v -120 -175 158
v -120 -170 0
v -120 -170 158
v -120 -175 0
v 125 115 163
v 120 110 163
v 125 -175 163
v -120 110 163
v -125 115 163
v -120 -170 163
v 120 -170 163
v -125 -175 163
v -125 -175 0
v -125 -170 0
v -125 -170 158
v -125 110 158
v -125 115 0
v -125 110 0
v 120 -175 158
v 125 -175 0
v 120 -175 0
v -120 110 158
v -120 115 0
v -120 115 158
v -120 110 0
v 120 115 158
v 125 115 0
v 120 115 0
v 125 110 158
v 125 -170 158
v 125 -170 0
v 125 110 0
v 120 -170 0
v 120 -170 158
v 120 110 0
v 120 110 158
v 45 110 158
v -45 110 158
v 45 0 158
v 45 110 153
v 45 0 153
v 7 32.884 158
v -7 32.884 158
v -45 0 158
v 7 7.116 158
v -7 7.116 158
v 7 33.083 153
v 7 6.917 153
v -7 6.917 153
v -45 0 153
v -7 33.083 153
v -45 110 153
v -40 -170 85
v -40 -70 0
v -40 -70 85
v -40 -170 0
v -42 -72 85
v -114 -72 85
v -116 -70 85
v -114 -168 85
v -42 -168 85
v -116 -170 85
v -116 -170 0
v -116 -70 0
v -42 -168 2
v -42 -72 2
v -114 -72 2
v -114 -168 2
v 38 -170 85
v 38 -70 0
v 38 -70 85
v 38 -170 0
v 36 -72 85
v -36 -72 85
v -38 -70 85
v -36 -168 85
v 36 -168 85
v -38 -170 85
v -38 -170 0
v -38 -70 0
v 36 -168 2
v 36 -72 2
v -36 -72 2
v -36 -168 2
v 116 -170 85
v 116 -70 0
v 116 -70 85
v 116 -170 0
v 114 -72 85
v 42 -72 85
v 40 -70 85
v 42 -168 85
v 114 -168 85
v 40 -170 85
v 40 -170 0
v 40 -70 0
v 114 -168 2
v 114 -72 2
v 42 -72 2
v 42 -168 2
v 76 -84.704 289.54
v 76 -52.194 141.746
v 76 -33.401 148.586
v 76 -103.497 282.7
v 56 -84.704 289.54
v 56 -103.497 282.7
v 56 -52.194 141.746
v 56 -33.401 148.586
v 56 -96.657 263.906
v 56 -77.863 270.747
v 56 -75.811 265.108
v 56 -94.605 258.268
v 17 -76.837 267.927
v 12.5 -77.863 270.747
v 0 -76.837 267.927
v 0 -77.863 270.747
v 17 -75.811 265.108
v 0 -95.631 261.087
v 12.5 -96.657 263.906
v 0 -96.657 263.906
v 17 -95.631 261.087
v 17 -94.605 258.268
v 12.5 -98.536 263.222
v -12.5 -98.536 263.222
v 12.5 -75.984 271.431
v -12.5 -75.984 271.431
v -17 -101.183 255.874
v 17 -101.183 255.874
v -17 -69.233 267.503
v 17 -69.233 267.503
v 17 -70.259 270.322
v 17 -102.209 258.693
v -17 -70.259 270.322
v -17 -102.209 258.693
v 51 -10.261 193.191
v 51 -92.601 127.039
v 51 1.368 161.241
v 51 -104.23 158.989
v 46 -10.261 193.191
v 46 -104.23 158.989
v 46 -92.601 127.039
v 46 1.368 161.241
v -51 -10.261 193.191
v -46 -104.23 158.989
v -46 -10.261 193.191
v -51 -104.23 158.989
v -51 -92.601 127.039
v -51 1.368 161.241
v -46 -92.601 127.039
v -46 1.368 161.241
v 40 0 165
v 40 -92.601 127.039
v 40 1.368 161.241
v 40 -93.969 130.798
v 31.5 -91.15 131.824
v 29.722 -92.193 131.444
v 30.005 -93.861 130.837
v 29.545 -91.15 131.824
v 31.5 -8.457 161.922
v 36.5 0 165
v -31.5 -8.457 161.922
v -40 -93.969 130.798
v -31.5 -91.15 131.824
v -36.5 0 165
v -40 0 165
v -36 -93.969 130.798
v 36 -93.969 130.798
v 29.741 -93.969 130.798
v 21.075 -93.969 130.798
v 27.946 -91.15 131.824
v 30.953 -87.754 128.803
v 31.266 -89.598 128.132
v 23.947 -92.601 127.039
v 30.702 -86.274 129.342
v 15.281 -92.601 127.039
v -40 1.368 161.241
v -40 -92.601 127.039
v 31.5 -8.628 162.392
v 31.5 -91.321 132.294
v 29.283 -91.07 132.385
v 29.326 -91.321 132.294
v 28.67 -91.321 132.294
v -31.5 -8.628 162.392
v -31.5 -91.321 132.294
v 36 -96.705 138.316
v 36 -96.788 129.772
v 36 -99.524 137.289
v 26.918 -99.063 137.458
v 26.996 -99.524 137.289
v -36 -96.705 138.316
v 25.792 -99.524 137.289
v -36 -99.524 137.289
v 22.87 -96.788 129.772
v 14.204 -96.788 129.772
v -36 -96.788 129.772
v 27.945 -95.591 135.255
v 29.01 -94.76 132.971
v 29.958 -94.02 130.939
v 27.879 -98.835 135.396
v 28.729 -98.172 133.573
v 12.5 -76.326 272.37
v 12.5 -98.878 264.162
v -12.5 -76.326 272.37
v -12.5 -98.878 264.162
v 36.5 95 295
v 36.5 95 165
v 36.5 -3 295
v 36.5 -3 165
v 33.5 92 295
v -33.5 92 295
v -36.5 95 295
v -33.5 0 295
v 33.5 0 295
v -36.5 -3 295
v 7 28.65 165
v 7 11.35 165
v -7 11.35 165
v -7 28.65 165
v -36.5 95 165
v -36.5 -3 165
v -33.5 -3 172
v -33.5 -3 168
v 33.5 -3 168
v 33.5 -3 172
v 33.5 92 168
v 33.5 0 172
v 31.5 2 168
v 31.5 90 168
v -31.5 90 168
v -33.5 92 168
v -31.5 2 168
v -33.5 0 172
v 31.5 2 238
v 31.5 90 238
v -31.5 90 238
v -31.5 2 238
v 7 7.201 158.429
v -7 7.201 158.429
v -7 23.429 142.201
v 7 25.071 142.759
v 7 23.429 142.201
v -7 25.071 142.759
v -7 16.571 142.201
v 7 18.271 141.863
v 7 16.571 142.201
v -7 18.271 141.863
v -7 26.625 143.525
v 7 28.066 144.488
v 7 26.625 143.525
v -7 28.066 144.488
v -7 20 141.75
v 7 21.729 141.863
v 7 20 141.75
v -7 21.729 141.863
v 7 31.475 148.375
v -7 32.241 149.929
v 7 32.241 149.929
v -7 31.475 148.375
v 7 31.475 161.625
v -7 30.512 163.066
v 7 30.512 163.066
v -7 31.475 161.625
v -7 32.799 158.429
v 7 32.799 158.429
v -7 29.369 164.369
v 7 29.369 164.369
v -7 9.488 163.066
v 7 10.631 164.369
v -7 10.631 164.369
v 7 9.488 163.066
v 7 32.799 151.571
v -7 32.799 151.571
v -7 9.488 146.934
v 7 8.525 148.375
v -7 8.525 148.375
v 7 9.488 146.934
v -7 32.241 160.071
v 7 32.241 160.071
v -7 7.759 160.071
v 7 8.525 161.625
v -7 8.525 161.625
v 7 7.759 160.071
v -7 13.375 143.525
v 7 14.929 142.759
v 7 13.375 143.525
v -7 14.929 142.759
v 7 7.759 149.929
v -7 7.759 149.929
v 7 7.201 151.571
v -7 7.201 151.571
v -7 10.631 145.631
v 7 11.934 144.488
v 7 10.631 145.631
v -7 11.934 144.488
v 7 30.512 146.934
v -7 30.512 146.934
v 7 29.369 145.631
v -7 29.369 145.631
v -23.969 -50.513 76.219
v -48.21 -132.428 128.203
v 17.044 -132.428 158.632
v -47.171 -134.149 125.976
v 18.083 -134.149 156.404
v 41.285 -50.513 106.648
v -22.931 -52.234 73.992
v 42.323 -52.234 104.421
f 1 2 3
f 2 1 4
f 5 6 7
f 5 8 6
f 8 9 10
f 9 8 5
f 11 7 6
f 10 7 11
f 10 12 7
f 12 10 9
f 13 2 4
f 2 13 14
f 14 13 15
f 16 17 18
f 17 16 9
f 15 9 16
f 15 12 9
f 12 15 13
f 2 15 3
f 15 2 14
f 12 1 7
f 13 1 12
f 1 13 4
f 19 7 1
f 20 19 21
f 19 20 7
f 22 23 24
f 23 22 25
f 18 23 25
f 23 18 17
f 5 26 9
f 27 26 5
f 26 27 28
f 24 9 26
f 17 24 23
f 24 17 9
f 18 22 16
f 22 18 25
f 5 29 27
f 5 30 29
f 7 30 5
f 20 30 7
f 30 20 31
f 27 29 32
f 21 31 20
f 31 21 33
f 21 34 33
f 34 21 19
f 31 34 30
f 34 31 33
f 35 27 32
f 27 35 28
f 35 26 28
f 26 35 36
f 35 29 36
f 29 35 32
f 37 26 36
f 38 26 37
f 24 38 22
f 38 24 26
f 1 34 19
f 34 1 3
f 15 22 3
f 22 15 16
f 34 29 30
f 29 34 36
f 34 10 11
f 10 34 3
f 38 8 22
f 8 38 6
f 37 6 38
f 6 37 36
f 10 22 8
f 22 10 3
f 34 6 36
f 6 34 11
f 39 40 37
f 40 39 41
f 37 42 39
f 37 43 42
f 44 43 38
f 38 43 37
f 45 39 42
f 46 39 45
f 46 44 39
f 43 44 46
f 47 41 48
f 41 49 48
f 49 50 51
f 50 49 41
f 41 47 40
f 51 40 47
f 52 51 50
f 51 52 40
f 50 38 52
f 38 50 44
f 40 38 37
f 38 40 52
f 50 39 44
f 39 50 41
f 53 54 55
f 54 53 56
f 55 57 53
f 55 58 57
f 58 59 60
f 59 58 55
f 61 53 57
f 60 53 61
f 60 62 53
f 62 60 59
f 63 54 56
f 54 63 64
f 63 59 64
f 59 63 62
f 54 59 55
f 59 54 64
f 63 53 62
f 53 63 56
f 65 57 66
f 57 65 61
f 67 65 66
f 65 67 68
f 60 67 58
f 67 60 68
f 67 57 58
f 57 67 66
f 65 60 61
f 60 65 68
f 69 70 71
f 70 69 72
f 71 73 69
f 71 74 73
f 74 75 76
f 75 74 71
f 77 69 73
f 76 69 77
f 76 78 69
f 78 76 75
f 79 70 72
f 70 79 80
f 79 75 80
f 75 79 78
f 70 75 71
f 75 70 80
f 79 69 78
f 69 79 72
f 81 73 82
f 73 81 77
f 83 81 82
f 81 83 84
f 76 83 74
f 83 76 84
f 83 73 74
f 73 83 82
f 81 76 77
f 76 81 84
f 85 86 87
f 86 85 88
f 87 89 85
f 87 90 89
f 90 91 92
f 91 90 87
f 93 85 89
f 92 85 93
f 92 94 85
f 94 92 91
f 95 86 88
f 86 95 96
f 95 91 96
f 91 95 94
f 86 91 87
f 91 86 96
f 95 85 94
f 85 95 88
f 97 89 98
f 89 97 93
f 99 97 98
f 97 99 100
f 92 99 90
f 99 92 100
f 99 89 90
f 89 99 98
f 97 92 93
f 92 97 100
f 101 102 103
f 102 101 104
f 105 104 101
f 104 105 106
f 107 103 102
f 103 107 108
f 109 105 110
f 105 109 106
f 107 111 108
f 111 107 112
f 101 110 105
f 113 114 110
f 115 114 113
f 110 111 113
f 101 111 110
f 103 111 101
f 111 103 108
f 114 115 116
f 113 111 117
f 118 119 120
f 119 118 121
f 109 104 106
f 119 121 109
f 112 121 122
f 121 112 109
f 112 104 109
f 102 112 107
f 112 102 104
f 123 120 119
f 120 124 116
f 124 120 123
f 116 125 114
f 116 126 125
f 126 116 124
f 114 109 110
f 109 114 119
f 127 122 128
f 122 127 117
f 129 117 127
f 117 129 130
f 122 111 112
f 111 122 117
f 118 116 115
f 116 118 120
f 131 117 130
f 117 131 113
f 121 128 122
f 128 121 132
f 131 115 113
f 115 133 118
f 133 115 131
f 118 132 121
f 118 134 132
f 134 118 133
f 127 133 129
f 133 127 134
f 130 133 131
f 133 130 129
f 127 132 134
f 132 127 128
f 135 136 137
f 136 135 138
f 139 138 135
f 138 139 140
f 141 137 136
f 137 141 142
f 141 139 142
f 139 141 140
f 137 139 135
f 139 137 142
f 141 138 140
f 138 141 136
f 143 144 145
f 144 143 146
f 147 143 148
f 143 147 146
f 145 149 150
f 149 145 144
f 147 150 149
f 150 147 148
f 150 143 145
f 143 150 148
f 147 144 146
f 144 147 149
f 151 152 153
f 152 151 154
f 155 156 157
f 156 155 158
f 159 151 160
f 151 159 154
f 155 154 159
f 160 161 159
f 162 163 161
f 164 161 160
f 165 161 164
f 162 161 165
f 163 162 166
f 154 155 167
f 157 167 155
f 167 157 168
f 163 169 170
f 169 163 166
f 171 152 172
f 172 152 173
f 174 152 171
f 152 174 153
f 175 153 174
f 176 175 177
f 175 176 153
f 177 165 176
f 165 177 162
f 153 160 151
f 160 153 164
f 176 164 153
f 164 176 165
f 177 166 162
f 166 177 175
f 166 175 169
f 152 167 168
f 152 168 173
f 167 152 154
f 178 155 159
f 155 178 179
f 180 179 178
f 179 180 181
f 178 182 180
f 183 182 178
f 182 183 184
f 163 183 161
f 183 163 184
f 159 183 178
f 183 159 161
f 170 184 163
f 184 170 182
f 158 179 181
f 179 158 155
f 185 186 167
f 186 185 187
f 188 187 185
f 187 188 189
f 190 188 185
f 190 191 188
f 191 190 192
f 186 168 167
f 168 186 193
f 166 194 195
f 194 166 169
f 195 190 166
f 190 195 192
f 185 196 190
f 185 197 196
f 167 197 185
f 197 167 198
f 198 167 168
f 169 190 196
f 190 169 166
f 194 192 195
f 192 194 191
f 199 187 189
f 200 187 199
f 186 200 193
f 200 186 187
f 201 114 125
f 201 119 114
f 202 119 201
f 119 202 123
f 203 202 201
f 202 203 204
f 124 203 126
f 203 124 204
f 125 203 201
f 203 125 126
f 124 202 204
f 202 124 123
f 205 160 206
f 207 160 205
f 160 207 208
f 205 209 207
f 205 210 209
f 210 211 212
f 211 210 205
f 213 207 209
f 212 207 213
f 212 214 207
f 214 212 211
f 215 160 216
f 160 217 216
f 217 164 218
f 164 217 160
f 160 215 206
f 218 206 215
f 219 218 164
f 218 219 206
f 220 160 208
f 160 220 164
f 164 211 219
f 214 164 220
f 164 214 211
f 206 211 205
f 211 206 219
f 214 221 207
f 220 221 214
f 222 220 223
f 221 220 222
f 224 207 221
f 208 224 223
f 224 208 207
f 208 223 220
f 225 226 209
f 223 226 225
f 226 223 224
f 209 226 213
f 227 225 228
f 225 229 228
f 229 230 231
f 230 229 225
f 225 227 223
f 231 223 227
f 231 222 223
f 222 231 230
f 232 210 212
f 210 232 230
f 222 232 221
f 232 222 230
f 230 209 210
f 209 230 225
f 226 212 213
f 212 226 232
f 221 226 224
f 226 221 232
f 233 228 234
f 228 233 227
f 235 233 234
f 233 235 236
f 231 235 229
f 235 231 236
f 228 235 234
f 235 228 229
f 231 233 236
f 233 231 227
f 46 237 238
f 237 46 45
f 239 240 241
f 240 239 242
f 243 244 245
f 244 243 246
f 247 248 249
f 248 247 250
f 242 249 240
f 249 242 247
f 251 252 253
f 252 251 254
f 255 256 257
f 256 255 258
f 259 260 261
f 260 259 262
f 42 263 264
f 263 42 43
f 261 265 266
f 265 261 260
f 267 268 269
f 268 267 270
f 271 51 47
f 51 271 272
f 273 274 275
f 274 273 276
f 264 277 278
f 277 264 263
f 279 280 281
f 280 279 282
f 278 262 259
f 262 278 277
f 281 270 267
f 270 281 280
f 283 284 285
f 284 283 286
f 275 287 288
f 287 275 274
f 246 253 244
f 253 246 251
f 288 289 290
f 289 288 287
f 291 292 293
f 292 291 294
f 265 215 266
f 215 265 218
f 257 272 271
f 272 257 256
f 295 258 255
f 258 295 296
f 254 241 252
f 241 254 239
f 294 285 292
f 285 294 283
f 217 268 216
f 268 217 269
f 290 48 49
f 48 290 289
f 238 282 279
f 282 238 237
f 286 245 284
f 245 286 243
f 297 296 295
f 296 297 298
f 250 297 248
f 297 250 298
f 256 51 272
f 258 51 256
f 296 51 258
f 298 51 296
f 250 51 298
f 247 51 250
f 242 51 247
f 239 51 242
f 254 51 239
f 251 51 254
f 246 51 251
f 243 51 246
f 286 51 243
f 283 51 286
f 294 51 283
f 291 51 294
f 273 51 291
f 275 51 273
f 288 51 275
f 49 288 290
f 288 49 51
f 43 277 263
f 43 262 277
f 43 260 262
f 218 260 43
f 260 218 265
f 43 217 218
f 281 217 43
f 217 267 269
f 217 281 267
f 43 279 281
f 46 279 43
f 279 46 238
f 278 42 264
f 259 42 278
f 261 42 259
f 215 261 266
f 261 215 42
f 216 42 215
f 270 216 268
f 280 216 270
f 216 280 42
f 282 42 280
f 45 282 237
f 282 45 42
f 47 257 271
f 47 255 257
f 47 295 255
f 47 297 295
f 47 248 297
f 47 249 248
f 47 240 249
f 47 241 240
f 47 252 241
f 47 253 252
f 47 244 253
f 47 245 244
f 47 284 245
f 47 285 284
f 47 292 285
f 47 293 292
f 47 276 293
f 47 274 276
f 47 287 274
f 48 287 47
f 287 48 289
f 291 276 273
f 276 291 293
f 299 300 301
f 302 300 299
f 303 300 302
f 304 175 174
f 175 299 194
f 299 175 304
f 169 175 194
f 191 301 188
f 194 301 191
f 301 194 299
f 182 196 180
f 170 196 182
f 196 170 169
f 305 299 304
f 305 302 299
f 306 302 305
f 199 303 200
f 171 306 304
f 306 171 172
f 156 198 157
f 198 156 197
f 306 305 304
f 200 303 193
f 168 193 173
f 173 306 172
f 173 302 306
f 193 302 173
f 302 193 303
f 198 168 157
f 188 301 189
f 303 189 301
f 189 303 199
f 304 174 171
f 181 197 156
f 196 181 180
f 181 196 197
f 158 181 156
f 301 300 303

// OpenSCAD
// What is INSIDE the full sifter (see sifter_concept.scad for the outside), in the style of the Roca Sifter: a countertop box
// with a card stack at the back, a camera tower, and three bins at the front.
//
// This is a PICTURE of the plan, not printable parts. The pieces get designed one at a
// time (feeder_test.scad is the first) and tested before the next one is built.
//
// Card path, back to front:
//   1. hopper: up to ~400 cards, face up
//   2. pick roller pushes the bottom card under the gate
//   3. card slides down the sloped scan bed and stops against the stop gate
//   4. camera in the tower takes the picture
//   5. stop gate drops, card slides into the chute
//   6. chute tilts left / centre / right into bin 1, 2 or 3

card_w = 63;
card_l = 88;
bed_angle = 20;       // steep enough for cards to slide on PLA
bed_len = 100;
bed_top = 165;        // height of the scan bed's back edge
cam_height = 120;     // camera above the card, square to the bed
bin_w = 76;
bin_l = 100;
bin_h = 85;           // holds about 250 cards
hopper_h = 130;       // holds about 400 cards

$fn = 48;

// --- bins ----------------------------------------------------------------------
module bins() {
    for (i = [-1, 0, 1]) translate([i * (bin_w + 2) - bin_w / 2, -bin_l - 70, 0]) difference() {
        cube([bin_w, bin_l, bin_h]);
        translate([2, 2, 2]) cube([bin_w - 4, bin_l - 4, bin_h]);
    }
}

// --- chute: a tray that slides cards down into a bin; a servo tilts it sideways ----
module chute(tilt = -25) {
    translate([0, -85, bin_h + 25]) rotate([0, tilt, 0]) rotate([-35, 0, 0])
        difference() {
            translate([-36, -60, 0]) cube([72, 100, 3]);
        }
}

// --- scan bed, tilted down towards the front -------------------------------------------
module bed() {
    translate([0, 0, bed_top]) rotate([bed_angle, 0, 0]) {
        color("white") translate([-40, -bed_len, -4]) cube([80, bed_len, 4]);
        // card resting against the stop gate
        color("tan") translate([-card_w / 2, -bed_len + 3, 0]) cube([card_w, card_l, 0.5]);
        // stop gate (servo flips it down to let the card go)
        color("orange") translate([-36, -bed_len - 3, 0]) cube([72, 3, 8]);
        // camera tower beside the bed (not in the card's path), square to the bed
        color("lightblue") {
            translate([56, -bed_len / 2 + 3 - 10, -4]) cube([20, 20, cam_height + 30]);
            translate([0, -bed_len / 2 + 3 - 10, cam_height]) cube([76, 20, 6]);
            translate([-17, -bed_len / 2 + 3 - 17, cam_height]) cube([34, 34, 3]);
        }
        color("green") translate([-12.5, -bed_len / 2 + 3 - 12, cam_height + 6]) cube([25, 24, 1]);
        // light walls on both sides
        for (m = [0, 1]) mirror([m, 0, 0]) color("white") translate([46, -bed_len, -4]) cube([5, bed_len, 34]);
    }
}

// --- hopper with the pick roller underneath (see feeder_test.scad) --------------------
module hopper() {
    in_w = card_w + 4; in_l = card_l + 4;
    translate([0, 0, bed_top]) {
        color("white") difference() {
            translate([-in_w / 2 - 3, -3, 0]) cube([in_w + 6, in_l + 6, hopper_h]);
            translate([-in_w / 2, 0, 3]) cube([in_w, in_l, hopper_h]);
            translate([-in_w / 2, -4, 3]) cube([in_w, 5, 4]);  // gate slot
        }
        color("tan") translate([-card_w / 2, 2, 3]) cube([card_w, card_l, 70]);
        color("black") translate([0, 20, -10]) rotate([0, 90, 0]) cylinder(d = 26.5, h = 14, center = true);
    }
}

// --- body: drawn as an open frame so the inside shows ------------------------------
module body() {
    color("dimgray") {
        for (x = [-125, 120], y = [-175, 110]) translate([x, y, 0]) cube([5, 5, bed_top - 2]);
        for (y = [-175, 110]) translate([-125, y, bed_top - 7]) cube([250, 5, 5]);
        for (x = [-125, 120]) translate([x, -175, bed_top - 7]) cube([5, 290, 5]);
        // shelf the hopper and bed sit on
        translate([-45, 0, bed_top - 12]) cube([90, 110, 5]);
    }
}

body();
bins();
color("orange") chute();
bed();
hopper();
